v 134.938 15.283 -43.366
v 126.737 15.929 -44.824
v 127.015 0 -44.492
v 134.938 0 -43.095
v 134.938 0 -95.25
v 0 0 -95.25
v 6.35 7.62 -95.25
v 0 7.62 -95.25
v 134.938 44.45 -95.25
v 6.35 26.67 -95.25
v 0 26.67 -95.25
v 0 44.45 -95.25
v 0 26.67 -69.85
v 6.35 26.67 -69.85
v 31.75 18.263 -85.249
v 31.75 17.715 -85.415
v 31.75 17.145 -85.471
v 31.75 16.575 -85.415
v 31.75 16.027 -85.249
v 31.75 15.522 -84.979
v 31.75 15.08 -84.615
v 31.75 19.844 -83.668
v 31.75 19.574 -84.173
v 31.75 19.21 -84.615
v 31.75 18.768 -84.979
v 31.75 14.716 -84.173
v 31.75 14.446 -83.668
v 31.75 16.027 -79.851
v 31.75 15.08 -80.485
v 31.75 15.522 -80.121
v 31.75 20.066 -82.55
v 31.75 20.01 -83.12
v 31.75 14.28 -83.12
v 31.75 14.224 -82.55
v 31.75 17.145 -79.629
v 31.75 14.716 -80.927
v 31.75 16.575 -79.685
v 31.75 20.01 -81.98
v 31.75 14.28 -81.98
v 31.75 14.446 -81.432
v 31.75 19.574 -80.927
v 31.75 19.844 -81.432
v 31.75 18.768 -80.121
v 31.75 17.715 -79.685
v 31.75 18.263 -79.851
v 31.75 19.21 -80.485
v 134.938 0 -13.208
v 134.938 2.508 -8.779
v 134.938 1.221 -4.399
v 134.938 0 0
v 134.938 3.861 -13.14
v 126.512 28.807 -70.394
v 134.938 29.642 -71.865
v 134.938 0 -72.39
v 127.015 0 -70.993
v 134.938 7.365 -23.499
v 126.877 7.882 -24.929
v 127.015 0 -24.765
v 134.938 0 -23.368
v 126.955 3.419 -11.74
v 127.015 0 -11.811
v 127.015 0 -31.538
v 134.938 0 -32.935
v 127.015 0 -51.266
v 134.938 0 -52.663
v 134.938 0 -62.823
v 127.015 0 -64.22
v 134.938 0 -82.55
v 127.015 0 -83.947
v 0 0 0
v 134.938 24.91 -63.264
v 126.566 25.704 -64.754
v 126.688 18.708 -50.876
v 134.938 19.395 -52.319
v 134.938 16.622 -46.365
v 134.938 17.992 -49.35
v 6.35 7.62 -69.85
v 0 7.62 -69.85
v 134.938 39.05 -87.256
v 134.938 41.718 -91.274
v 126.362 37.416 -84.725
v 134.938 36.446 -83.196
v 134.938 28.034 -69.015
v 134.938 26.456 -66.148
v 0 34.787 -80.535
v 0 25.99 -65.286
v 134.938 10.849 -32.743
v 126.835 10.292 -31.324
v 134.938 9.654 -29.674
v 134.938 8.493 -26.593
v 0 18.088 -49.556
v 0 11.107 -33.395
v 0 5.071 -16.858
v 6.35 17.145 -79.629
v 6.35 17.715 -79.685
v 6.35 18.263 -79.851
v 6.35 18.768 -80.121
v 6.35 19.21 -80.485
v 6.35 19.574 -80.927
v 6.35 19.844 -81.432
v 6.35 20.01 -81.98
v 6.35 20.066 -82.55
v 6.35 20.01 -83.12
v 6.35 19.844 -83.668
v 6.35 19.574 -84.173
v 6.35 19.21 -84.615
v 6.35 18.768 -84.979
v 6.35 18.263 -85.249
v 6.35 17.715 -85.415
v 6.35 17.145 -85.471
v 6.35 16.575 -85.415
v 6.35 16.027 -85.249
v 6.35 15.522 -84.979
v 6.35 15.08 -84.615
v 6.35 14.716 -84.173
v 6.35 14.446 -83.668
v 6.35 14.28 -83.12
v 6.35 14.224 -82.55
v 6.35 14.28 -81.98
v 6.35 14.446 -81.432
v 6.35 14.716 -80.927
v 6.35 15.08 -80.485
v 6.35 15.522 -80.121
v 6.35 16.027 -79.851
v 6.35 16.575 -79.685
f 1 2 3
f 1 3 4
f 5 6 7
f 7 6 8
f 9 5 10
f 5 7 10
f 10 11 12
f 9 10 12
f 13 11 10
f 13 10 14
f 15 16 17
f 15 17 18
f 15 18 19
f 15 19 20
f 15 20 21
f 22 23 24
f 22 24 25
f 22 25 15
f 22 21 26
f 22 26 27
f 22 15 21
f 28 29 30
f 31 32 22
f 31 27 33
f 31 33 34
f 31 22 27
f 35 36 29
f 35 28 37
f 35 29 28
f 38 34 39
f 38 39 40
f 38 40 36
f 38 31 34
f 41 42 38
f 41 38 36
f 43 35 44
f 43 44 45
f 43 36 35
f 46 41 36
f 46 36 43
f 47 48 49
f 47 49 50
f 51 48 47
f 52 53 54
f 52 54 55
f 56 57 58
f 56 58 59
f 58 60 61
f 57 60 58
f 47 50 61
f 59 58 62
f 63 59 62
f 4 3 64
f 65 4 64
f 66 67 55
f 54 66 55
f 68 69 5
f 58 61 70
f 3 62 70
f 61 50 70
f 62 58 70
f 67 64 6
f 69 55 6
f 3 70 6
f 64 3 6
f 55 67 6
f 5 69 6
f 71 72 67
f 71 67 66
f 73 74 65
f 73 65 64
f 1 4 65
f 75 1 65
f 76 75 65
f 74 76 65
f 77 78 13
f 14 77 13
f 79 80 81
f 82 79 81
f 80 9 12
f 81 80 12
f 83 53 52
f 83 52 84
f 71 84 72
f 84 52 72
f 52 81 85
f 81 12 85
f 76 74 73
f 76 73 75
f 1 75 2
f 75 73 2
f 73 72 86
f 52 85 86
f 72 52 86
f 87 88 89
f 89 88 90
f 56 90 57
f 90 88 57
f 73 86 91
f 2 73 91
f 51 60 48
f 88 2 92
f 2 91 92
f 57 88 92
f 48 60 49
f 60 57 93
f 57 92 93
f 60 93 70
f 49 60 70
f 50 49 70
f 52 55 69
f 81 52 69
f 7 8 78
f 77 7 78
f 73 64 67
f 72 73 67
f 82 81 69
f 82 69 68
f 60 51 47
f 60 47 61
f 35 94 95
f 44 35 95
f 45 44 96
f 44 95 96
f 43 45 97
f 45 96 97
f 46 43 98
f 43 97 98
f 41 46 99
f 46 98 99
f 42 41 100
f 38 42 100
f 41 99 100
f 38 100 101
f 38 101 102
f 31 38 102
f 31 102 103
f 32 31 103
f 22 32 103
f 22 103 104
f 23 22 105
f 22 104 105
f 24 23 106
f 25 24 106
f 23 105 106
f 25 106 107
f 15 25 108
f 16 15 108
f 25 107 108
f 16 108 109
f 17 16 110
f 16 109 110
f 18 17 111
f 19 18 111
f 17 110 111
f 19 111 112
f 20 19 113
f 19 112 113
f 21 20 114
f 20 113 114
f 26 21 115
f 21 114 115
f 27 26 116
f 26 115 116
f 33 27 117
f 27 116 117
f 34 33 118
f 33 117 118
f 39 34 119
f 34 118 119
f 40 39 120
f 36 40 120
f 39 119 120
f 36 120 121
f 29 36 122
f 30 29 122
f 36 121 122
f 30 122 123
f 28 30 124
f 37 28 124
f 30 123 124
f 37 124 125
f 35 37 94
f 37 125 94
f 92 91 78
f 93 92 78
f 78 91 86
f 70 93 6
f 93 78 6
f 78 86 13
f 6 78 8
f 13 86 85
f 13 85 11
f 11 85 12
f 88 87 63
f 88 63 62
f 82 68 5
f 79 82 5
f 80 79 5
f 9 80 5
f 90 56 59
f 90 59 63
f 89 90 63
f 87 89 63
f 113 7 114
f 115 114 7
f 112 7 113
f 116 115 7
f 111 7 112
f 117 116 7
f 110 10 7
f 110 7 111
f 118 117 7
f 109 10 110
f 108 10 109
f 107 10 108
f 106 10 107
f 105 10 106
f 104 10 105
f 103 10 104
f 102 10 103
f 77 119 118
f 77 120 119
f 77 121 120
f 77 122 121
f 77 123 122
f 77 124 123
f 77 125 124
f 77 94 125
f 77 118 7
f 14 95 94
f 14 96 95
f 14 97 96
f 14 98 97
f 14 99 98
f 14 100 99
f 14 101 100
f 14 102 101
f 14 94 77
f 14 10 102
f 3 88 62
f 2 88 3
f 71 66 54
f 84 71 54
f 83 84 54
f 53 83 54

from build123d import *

# Parameters (mm, degrees)
BOSS_EXTRUDE1_DEPTH = 134.9375
SKETCH4_W           = 25.4
SKETCH4_H           = 19.05
CUT_EXTRUDE1_DEPTH  = 6.35
SKETCH5_R           = 2.921
CUT_EXTRUDE2_DEPTH  = 25.4
CUT_EXTRUDE3_DEPTH  = 38.1
CUT_EXTRUDE3_TAPER  = -1


with BuildPart() as part:
    # Sketch3 → Boss-Extrude1 (new body)
    with BuildSketch(Plane(origin=(0, 0, 0), x_dir=(0, 0, -1), z_dir=(1, 0, 0))):
        with BuildLine():
            Line((0, 0), (95.25, 0))
            Line((95.25, 0), (95.25, 44.45))
            ThreePointArc((95.25, 44.45), (49.555547135, 18.088113282), (0, 0))
        make_face()
    extrude(amount=BOSS_EXTRUDE1_DEPTH)

    # Sketch4 → Cut-Extrude1 (cut)
    with BuildSketch(Plane.ZY):
        with Locations((-82.55, 17.145)):
            Rectangle(SKETCH4_W, SKETCH4_H)
    extrude(amount=-CUT_EXTRUDE1_DEPTH, mode=Mode.SUBTRACT)

    # Sketch5 → Cut-Extrude2 (cut)
    with BuildSketch(Plane.ZY.offset(-6.35)):
        with Locations((-82.55, 17.145)):
            Circle(SKETCH5_R)
    extrude(amount=-CUT_EXTRUDE2_DEPTH, mode=Mode.SUBTRACT)

    # Sketch6 → Cut-Extrude3 (cut)
    with BuildSketch(Plane.XZ):
        Polygon((134.9375, -82.55), (134.9375, -72.39), (127.014719298, -70.993), (127.014719298, -83.947), align=None)
        Polygon((134.9375, -62.822666667), (134.9375, -52.662666667), (127.014719298, -51.265666667), (127.014719298, -64.219666667), align=None)
        Polygon((134.9375, -43.095333333), (134.9375, -32.935333333), (127.014719298, -31.538333333), (127.014719298, -44.492333333), align=None)
        Polygon((134.9375, -23.368), (134.9375, -13.208), (127.014719298, -11.811), (127.014719298, -24.765), align=None)
    extrude(amount=-CUT_EXTRUDE3_DEPTH, taper=CUT_EXTRUDE3_TAPER, mode=Mode.SUBTRACT)


solid = part.part
